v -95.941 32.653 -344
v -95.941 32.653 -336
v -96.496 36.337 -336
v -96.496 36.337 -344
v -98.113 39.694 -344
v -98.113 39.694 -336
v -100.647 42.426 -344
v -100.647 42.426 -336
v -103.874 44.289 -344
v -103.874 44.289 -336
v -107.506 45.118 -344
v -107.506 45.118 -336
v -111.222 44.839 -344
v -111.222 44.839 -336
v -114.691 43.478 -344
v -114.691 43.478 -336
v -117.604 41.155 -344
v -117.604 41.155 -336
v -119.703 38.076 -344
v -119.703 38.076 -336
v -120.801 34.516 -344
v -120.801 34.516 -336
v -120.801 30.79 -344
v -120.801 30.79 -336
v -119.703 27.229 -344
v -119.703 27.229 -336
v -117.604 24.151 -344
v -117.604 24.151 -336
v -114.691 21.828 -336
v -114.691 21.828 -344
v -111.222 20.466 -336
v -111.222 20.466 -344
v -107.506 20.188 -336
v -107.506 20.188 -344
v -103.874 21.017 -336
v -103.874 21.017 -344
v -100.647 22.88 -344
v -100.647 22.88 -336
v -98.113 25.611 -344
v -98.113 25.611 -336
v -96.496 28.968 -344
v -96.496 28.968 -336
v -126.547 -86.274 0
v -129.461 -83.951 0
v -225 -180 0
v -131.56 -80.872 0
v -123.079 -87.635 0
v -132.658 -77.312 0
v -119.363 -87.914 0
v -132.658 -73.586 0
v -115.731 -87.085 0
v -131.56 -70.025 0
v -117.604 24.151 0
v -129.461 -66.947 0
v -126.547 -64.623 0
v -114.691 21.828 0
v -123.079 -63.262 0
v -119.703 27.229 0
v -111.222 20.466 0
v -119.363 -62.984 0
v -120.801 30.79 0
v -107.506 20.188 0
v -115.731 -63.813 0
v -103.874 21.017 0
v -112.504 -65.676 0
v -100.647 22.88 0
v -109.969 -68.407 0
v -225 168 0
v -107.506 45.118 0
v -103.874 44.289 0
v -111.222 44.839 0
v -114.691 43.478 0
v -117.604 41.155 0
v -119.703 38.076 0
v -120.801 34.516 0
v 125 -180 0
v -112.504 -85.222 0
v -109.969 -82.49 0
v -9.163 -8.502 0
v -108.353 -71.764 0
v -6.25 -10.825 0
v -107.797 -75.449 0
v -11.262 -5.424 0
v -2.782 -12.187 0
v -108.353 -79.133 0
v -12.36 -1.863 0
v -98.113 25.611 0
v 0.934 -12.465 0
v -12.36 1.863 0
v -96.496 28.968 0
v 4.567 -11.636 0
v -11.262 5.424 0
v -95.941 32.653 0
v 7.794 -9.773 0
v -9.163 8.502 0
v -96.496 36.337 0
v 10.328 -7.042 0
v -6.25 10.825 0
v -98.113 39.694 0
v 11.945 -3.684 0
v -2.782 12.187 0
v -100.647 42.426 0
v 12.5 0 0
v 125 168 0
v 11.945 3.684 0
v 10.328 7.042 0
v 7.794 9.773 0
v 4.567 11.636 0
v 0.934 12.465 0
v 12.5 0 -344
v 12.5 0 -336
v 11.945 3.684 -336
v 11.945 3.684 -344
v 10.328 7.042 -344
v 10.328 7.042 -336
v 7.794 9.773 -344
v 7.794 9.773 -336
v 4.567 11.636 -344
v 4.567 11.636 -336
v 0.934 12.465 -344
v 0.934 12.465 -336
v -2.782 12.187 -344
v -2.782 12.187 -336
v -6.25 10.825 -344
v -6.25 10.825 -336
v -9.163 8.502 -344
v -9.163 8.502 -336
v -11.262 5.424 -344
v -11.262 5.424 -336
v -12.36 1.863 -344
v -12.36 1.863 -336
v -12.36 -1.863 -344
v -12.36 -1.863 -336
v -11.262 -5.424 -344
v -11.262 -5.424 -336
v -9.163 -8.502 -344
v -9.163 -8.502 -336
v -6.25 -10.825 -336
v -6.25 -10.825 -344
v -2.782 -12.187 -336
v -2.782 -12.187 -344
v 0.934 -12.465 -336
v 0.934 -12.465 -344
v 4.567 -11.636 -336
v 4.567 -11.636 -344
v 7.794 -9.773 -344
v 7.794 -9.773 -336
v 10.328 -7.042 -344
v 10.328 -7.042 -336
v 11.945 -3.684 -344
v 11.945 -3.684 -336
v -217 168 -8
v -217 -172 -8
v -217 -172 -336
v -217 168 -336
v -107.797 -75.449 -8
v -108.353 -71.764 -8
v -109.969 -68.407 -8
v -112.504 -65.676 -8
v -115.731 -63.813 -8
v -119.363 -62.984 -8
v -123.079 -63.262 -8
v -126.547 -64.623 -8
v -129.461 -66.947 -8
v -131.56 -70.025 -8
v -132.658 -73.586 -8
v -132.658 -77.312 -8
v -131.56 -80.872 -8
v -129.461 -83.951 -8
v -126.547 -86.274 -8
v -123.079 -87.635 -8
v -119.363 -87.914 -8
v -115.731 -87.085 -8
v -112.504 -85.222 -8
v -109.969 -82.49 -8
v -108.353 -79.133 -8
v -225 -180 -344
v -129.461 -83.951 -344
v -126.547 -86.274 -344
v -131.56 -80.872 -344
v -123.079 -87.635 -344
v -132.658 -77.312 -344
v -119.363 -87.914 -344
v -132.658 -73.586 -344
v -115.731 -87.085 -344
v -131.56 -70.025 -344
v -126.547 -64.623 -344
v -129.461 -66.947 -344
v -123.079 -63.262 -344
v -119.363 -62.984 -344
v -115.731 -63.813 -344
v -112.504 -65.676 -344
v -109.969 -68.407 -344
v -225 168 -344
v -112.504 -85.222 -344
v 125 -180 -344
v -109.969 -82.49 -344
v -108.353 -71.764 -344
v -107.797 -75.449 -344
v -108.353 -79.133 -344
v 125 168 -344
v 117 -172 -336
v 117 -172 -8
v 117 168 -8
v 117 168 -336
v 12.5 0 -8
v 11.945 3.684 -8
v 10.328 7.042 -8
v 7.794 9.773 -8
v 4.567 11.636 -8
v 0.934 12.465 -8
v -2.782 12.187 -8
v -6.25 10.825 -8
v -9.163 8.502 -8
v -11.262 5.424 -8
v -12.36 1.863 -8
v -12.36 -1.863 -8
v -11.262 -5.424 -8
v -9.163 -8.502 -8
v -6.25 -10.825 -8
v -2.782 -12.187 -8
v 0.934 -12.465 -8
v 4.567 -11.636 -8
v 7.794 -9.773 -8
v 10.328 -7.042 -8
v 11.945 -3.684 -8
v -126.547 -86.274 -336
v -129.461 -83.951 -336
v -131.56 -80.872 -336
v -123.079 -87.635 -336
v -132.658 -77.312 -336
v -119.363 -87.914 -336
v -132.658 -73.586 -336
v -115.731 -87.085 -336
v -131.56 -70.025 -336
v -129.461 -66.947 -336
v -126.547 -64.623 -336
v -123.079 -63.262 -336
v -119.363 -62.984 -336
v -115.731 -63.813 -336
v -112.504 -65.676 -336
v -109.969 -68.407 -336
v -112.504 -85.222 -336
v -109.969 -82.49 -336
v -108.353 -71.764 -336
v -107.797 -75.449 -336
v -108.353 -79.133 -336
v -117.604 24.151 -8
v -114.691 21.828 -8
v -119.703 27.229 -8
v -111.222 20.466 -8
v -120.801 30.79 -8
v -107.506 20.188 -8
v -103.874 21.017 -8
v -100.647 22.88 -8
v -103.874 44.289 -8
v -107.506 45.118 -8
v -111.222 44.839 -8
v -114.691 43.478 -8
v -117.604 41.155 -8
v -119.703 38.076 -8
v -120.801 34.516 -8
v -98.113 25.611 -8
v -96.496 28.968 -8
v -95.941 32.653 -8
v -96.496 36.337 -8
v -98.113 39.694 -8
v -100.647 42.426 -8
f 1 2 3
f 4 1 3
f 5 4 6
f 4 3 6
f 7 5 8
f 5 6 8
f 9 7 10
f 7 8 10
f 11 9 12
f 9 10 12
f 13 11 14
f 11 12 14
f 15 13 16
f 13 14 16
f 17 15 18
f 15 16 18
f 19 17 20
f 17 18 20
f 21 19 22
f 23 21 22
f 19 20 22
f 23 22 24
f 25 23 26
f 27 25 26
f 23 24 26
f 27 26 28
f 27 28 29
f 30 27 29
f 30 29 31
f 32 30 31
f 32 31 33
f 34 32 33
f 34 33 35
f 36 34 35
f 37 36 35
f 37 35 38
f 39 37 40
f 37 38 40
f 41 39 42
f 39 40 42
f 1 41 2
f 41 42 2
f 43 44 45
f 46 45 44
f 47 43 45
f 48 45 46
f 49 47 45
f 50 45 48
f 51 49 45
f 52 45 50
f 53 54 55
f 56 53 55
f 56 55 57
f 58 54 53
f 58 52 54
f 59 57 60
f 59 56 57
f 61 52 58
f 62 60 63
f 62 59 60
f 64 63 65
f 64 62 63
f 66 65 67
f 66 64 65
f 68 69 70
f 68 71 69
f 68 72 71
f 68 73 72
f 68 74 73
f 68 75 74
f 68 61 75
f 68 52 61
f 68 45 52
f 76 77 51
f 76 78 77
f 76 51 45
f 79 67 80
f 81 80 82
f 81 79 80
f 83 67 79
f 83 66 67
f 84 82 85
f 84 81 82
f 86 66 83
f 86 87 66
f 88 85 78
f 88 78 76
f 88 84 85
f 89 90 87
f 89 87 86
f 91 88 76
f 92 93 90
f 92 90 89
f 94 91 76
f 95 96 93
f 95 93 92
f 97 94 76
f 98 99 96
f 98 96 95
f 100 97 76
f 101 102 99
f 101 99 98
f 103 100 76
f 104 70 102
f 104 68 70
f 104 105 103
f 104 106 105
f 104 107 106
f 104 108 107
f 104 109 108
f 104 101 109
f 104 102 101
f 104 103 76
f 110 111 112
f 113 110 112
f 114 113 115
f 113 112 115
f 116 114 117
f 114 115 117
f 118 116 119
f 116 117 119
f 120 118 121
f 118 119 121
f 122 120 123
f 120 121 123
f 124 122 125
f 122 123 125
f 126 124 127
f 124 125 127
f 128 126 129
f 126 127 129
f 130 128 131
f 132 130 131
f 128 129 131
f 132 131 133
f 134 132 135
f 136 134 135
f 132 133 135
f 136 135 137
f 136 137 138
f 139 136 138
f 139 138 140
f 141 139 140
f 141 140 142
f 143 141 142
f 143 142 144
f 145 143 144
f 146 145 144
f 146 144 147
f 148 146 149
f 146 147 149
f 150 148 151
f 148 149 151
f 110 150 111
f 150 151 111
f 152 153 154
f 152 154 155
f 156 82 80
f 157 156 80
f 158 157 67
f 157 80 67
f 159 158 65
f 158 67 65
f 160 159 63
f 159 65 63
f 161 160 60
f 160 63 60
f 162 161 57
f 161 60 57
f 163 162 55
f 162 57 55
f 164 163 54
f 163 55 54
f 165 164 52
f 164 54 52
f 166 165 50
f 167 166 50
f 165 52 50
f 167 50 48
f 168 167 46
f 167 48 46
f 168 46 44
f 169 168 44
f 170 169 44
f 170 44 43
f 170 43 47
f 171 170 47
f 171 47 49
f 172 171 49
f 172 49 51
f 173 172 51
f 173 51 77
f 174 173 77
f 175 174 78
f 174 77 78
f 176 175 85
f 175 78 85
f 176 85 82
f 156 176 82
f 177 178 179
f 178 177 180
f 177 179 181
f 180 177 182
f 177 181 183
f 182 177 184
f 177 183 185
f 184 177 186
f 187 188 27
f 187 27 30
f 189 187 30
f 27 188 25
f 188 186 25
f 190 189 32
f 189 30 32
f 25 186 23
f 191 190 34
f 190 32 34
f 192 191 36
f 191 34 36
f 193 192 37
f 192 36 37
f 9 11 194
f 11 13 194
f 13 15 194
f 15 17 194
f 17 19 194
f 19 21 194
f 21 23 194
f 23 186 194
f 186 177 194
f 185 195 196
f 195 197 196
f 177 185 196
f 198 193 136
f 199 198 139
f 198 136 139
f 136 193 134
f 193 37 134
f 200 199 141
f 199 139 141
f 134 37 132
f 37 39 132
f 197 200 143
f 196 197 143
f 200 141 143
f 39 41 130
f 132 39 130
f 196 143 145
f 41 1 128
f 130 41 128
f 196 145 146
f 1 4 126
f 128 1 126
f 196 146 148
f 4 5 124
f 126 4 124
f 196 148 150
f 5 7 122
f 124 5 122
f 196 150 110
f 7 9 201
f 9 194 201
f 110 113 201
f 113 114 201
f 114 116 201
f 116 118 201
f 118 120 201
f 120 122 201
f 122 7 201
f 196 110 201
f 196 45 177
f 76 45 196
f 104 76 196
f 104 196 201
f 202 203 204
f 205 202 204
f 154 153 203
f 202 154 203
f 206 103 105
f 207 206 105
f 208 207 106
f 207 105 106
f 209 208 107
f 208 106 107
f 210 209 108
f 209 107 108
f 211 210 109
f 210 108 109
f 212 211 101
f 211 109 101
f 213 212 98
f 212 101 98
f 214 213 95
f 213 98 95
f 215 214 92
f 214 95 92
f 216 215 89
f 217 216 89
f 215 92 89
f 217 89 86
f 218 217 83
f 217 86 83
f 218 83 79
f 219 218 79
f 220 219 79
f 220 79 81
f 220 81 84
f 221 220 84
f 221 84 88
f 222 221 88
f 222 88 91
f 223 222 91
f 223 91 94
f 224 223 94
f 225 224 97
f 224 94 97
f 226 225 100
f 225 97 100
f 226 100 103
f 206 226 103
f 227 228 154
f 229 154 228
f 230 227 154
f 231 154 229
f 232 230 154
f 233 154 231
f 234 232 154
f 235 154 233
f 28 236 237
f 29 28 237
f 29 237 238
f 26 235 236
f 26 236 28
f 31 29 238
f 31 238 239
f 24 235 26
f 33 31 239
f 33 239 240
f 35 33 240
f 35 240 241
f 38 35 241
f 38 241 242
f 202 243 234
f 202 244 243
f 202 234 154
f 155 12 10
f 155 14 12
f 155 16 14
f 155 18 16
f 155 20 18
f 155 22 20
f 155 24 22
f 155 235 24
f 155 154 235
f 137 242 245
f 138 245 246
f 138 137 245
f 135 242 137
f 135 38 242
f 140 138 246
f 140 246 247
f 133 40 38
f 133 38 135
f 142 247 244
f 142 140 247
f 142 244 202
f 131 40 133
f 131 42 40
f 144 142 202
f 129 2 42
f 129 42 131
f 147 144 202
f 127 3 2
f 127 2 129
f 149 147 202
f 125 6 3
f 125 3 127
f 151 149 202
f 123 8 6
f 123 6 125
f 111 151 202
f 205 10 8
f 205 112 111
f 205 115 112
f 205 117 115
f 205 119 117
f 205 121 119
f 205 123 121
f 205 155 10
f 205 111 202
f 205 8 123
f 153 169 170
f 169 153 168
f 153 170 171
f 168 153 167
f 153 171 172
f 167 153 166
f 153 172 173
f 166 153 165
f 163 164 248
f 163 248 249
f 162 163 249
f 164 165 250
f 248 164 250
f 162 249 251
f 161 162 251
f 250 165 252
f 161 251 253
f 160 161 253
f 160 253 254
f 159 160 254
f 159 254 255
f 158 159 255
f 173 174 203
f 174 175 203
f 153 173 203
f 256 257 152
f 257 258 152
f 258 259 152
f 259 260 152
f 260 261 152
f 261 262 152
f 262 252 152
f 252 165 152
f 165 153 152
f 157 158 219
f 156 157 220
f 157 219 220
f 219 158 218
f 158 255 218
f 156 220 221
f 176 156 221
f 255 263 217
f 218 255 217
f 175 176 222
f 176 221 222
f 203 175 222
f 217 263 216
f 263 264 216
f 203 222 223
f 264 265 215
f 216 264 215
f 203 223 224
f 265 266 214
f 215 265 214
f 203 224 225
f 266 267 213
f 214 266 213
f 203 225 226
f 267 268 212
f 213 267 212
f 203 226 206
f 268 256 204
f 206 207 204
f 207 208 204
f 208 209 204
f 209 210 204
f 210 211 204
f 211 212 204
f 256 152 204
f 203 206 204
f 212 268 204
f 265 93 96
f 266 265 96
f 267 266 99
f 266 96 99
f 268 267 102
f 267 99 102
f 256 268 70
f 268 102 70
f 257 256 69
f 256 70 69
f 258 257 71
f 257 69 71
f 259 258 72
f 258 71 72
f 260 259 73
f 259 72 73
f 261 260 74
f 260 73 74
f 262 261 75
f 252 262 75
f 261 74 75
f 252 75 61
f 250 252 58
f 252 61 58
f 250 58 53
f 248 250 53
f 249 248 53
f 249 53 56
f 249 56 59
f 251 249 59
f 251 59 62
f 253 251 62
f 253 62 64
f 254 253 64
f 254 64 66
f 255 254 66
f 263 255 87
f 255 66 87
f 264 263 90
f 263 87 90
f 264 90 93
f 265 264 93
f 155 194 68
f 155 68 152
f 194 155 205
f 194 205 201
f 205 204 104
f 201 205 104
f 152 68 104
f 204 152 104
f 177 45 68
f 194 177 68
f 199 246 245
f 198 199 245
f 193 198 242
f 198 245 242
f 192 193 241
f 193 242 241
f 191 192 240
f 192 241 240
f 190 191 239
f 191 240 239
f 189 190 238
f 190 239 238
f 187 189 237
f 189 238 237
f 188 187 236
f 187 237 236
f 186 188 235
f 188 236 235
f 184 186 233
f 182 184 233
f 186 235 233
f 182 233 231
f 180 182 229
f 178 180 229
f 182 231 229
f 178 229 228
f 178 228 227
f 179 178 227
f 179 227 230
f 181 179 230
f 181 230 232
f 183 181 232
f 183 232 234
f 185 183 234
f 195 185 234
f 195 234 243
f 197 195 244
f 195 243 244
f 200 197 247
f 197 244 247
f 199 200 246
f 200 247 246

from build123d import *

# Parameters (mm, degrees)
IZIM1_W                     = 350
IZIM1_H                     = 348
IZIM1_R                     = 12.5
Y_KSEKLIK_EKSTR_ZYON4_DEPTH = 344
BO_ALTMA2_T                 = -8


with BuildPart() as part:
    # Çizim1 → Yükseklik-Ekstrüzyon4 (new body)
    with BuildSketch(Plane.XY):
        with Locations((-50, -6)):
            Rectangle(IZIM1_W, IZIM1_H)
        Circle(IZIM1_R, mode=Mode.SUBTRACT)
        with Locations((-108.440540321, 32.652897497)):
            Circle(IZIM1_R, mode=Mode.SUBTRACT)
        with Locations((-120.297461902, -75.448794953)):
            Circle(IZIM1_R, mode=Mode.SUBTRACT)
    extrude(amount=-Y_KSEKLIK_EKSTR_ZYON4_DEPTH)

    # İç Boşaltma2
    bo_altma2_openings = [part.faces().sort_by_distance(p)[0] for p in [
        (12.5, 0, -344),
        (-50, 168, -172),
        (-107.797461902, -75.448794953, -344),
        (-95.940540321, 32.652897497, -344),
    ]]
    offset(amount=BO_ALTMA2_T, openings=bo_altma2_openings, kind=Kind.INTERSECTION)


solid = part.part
